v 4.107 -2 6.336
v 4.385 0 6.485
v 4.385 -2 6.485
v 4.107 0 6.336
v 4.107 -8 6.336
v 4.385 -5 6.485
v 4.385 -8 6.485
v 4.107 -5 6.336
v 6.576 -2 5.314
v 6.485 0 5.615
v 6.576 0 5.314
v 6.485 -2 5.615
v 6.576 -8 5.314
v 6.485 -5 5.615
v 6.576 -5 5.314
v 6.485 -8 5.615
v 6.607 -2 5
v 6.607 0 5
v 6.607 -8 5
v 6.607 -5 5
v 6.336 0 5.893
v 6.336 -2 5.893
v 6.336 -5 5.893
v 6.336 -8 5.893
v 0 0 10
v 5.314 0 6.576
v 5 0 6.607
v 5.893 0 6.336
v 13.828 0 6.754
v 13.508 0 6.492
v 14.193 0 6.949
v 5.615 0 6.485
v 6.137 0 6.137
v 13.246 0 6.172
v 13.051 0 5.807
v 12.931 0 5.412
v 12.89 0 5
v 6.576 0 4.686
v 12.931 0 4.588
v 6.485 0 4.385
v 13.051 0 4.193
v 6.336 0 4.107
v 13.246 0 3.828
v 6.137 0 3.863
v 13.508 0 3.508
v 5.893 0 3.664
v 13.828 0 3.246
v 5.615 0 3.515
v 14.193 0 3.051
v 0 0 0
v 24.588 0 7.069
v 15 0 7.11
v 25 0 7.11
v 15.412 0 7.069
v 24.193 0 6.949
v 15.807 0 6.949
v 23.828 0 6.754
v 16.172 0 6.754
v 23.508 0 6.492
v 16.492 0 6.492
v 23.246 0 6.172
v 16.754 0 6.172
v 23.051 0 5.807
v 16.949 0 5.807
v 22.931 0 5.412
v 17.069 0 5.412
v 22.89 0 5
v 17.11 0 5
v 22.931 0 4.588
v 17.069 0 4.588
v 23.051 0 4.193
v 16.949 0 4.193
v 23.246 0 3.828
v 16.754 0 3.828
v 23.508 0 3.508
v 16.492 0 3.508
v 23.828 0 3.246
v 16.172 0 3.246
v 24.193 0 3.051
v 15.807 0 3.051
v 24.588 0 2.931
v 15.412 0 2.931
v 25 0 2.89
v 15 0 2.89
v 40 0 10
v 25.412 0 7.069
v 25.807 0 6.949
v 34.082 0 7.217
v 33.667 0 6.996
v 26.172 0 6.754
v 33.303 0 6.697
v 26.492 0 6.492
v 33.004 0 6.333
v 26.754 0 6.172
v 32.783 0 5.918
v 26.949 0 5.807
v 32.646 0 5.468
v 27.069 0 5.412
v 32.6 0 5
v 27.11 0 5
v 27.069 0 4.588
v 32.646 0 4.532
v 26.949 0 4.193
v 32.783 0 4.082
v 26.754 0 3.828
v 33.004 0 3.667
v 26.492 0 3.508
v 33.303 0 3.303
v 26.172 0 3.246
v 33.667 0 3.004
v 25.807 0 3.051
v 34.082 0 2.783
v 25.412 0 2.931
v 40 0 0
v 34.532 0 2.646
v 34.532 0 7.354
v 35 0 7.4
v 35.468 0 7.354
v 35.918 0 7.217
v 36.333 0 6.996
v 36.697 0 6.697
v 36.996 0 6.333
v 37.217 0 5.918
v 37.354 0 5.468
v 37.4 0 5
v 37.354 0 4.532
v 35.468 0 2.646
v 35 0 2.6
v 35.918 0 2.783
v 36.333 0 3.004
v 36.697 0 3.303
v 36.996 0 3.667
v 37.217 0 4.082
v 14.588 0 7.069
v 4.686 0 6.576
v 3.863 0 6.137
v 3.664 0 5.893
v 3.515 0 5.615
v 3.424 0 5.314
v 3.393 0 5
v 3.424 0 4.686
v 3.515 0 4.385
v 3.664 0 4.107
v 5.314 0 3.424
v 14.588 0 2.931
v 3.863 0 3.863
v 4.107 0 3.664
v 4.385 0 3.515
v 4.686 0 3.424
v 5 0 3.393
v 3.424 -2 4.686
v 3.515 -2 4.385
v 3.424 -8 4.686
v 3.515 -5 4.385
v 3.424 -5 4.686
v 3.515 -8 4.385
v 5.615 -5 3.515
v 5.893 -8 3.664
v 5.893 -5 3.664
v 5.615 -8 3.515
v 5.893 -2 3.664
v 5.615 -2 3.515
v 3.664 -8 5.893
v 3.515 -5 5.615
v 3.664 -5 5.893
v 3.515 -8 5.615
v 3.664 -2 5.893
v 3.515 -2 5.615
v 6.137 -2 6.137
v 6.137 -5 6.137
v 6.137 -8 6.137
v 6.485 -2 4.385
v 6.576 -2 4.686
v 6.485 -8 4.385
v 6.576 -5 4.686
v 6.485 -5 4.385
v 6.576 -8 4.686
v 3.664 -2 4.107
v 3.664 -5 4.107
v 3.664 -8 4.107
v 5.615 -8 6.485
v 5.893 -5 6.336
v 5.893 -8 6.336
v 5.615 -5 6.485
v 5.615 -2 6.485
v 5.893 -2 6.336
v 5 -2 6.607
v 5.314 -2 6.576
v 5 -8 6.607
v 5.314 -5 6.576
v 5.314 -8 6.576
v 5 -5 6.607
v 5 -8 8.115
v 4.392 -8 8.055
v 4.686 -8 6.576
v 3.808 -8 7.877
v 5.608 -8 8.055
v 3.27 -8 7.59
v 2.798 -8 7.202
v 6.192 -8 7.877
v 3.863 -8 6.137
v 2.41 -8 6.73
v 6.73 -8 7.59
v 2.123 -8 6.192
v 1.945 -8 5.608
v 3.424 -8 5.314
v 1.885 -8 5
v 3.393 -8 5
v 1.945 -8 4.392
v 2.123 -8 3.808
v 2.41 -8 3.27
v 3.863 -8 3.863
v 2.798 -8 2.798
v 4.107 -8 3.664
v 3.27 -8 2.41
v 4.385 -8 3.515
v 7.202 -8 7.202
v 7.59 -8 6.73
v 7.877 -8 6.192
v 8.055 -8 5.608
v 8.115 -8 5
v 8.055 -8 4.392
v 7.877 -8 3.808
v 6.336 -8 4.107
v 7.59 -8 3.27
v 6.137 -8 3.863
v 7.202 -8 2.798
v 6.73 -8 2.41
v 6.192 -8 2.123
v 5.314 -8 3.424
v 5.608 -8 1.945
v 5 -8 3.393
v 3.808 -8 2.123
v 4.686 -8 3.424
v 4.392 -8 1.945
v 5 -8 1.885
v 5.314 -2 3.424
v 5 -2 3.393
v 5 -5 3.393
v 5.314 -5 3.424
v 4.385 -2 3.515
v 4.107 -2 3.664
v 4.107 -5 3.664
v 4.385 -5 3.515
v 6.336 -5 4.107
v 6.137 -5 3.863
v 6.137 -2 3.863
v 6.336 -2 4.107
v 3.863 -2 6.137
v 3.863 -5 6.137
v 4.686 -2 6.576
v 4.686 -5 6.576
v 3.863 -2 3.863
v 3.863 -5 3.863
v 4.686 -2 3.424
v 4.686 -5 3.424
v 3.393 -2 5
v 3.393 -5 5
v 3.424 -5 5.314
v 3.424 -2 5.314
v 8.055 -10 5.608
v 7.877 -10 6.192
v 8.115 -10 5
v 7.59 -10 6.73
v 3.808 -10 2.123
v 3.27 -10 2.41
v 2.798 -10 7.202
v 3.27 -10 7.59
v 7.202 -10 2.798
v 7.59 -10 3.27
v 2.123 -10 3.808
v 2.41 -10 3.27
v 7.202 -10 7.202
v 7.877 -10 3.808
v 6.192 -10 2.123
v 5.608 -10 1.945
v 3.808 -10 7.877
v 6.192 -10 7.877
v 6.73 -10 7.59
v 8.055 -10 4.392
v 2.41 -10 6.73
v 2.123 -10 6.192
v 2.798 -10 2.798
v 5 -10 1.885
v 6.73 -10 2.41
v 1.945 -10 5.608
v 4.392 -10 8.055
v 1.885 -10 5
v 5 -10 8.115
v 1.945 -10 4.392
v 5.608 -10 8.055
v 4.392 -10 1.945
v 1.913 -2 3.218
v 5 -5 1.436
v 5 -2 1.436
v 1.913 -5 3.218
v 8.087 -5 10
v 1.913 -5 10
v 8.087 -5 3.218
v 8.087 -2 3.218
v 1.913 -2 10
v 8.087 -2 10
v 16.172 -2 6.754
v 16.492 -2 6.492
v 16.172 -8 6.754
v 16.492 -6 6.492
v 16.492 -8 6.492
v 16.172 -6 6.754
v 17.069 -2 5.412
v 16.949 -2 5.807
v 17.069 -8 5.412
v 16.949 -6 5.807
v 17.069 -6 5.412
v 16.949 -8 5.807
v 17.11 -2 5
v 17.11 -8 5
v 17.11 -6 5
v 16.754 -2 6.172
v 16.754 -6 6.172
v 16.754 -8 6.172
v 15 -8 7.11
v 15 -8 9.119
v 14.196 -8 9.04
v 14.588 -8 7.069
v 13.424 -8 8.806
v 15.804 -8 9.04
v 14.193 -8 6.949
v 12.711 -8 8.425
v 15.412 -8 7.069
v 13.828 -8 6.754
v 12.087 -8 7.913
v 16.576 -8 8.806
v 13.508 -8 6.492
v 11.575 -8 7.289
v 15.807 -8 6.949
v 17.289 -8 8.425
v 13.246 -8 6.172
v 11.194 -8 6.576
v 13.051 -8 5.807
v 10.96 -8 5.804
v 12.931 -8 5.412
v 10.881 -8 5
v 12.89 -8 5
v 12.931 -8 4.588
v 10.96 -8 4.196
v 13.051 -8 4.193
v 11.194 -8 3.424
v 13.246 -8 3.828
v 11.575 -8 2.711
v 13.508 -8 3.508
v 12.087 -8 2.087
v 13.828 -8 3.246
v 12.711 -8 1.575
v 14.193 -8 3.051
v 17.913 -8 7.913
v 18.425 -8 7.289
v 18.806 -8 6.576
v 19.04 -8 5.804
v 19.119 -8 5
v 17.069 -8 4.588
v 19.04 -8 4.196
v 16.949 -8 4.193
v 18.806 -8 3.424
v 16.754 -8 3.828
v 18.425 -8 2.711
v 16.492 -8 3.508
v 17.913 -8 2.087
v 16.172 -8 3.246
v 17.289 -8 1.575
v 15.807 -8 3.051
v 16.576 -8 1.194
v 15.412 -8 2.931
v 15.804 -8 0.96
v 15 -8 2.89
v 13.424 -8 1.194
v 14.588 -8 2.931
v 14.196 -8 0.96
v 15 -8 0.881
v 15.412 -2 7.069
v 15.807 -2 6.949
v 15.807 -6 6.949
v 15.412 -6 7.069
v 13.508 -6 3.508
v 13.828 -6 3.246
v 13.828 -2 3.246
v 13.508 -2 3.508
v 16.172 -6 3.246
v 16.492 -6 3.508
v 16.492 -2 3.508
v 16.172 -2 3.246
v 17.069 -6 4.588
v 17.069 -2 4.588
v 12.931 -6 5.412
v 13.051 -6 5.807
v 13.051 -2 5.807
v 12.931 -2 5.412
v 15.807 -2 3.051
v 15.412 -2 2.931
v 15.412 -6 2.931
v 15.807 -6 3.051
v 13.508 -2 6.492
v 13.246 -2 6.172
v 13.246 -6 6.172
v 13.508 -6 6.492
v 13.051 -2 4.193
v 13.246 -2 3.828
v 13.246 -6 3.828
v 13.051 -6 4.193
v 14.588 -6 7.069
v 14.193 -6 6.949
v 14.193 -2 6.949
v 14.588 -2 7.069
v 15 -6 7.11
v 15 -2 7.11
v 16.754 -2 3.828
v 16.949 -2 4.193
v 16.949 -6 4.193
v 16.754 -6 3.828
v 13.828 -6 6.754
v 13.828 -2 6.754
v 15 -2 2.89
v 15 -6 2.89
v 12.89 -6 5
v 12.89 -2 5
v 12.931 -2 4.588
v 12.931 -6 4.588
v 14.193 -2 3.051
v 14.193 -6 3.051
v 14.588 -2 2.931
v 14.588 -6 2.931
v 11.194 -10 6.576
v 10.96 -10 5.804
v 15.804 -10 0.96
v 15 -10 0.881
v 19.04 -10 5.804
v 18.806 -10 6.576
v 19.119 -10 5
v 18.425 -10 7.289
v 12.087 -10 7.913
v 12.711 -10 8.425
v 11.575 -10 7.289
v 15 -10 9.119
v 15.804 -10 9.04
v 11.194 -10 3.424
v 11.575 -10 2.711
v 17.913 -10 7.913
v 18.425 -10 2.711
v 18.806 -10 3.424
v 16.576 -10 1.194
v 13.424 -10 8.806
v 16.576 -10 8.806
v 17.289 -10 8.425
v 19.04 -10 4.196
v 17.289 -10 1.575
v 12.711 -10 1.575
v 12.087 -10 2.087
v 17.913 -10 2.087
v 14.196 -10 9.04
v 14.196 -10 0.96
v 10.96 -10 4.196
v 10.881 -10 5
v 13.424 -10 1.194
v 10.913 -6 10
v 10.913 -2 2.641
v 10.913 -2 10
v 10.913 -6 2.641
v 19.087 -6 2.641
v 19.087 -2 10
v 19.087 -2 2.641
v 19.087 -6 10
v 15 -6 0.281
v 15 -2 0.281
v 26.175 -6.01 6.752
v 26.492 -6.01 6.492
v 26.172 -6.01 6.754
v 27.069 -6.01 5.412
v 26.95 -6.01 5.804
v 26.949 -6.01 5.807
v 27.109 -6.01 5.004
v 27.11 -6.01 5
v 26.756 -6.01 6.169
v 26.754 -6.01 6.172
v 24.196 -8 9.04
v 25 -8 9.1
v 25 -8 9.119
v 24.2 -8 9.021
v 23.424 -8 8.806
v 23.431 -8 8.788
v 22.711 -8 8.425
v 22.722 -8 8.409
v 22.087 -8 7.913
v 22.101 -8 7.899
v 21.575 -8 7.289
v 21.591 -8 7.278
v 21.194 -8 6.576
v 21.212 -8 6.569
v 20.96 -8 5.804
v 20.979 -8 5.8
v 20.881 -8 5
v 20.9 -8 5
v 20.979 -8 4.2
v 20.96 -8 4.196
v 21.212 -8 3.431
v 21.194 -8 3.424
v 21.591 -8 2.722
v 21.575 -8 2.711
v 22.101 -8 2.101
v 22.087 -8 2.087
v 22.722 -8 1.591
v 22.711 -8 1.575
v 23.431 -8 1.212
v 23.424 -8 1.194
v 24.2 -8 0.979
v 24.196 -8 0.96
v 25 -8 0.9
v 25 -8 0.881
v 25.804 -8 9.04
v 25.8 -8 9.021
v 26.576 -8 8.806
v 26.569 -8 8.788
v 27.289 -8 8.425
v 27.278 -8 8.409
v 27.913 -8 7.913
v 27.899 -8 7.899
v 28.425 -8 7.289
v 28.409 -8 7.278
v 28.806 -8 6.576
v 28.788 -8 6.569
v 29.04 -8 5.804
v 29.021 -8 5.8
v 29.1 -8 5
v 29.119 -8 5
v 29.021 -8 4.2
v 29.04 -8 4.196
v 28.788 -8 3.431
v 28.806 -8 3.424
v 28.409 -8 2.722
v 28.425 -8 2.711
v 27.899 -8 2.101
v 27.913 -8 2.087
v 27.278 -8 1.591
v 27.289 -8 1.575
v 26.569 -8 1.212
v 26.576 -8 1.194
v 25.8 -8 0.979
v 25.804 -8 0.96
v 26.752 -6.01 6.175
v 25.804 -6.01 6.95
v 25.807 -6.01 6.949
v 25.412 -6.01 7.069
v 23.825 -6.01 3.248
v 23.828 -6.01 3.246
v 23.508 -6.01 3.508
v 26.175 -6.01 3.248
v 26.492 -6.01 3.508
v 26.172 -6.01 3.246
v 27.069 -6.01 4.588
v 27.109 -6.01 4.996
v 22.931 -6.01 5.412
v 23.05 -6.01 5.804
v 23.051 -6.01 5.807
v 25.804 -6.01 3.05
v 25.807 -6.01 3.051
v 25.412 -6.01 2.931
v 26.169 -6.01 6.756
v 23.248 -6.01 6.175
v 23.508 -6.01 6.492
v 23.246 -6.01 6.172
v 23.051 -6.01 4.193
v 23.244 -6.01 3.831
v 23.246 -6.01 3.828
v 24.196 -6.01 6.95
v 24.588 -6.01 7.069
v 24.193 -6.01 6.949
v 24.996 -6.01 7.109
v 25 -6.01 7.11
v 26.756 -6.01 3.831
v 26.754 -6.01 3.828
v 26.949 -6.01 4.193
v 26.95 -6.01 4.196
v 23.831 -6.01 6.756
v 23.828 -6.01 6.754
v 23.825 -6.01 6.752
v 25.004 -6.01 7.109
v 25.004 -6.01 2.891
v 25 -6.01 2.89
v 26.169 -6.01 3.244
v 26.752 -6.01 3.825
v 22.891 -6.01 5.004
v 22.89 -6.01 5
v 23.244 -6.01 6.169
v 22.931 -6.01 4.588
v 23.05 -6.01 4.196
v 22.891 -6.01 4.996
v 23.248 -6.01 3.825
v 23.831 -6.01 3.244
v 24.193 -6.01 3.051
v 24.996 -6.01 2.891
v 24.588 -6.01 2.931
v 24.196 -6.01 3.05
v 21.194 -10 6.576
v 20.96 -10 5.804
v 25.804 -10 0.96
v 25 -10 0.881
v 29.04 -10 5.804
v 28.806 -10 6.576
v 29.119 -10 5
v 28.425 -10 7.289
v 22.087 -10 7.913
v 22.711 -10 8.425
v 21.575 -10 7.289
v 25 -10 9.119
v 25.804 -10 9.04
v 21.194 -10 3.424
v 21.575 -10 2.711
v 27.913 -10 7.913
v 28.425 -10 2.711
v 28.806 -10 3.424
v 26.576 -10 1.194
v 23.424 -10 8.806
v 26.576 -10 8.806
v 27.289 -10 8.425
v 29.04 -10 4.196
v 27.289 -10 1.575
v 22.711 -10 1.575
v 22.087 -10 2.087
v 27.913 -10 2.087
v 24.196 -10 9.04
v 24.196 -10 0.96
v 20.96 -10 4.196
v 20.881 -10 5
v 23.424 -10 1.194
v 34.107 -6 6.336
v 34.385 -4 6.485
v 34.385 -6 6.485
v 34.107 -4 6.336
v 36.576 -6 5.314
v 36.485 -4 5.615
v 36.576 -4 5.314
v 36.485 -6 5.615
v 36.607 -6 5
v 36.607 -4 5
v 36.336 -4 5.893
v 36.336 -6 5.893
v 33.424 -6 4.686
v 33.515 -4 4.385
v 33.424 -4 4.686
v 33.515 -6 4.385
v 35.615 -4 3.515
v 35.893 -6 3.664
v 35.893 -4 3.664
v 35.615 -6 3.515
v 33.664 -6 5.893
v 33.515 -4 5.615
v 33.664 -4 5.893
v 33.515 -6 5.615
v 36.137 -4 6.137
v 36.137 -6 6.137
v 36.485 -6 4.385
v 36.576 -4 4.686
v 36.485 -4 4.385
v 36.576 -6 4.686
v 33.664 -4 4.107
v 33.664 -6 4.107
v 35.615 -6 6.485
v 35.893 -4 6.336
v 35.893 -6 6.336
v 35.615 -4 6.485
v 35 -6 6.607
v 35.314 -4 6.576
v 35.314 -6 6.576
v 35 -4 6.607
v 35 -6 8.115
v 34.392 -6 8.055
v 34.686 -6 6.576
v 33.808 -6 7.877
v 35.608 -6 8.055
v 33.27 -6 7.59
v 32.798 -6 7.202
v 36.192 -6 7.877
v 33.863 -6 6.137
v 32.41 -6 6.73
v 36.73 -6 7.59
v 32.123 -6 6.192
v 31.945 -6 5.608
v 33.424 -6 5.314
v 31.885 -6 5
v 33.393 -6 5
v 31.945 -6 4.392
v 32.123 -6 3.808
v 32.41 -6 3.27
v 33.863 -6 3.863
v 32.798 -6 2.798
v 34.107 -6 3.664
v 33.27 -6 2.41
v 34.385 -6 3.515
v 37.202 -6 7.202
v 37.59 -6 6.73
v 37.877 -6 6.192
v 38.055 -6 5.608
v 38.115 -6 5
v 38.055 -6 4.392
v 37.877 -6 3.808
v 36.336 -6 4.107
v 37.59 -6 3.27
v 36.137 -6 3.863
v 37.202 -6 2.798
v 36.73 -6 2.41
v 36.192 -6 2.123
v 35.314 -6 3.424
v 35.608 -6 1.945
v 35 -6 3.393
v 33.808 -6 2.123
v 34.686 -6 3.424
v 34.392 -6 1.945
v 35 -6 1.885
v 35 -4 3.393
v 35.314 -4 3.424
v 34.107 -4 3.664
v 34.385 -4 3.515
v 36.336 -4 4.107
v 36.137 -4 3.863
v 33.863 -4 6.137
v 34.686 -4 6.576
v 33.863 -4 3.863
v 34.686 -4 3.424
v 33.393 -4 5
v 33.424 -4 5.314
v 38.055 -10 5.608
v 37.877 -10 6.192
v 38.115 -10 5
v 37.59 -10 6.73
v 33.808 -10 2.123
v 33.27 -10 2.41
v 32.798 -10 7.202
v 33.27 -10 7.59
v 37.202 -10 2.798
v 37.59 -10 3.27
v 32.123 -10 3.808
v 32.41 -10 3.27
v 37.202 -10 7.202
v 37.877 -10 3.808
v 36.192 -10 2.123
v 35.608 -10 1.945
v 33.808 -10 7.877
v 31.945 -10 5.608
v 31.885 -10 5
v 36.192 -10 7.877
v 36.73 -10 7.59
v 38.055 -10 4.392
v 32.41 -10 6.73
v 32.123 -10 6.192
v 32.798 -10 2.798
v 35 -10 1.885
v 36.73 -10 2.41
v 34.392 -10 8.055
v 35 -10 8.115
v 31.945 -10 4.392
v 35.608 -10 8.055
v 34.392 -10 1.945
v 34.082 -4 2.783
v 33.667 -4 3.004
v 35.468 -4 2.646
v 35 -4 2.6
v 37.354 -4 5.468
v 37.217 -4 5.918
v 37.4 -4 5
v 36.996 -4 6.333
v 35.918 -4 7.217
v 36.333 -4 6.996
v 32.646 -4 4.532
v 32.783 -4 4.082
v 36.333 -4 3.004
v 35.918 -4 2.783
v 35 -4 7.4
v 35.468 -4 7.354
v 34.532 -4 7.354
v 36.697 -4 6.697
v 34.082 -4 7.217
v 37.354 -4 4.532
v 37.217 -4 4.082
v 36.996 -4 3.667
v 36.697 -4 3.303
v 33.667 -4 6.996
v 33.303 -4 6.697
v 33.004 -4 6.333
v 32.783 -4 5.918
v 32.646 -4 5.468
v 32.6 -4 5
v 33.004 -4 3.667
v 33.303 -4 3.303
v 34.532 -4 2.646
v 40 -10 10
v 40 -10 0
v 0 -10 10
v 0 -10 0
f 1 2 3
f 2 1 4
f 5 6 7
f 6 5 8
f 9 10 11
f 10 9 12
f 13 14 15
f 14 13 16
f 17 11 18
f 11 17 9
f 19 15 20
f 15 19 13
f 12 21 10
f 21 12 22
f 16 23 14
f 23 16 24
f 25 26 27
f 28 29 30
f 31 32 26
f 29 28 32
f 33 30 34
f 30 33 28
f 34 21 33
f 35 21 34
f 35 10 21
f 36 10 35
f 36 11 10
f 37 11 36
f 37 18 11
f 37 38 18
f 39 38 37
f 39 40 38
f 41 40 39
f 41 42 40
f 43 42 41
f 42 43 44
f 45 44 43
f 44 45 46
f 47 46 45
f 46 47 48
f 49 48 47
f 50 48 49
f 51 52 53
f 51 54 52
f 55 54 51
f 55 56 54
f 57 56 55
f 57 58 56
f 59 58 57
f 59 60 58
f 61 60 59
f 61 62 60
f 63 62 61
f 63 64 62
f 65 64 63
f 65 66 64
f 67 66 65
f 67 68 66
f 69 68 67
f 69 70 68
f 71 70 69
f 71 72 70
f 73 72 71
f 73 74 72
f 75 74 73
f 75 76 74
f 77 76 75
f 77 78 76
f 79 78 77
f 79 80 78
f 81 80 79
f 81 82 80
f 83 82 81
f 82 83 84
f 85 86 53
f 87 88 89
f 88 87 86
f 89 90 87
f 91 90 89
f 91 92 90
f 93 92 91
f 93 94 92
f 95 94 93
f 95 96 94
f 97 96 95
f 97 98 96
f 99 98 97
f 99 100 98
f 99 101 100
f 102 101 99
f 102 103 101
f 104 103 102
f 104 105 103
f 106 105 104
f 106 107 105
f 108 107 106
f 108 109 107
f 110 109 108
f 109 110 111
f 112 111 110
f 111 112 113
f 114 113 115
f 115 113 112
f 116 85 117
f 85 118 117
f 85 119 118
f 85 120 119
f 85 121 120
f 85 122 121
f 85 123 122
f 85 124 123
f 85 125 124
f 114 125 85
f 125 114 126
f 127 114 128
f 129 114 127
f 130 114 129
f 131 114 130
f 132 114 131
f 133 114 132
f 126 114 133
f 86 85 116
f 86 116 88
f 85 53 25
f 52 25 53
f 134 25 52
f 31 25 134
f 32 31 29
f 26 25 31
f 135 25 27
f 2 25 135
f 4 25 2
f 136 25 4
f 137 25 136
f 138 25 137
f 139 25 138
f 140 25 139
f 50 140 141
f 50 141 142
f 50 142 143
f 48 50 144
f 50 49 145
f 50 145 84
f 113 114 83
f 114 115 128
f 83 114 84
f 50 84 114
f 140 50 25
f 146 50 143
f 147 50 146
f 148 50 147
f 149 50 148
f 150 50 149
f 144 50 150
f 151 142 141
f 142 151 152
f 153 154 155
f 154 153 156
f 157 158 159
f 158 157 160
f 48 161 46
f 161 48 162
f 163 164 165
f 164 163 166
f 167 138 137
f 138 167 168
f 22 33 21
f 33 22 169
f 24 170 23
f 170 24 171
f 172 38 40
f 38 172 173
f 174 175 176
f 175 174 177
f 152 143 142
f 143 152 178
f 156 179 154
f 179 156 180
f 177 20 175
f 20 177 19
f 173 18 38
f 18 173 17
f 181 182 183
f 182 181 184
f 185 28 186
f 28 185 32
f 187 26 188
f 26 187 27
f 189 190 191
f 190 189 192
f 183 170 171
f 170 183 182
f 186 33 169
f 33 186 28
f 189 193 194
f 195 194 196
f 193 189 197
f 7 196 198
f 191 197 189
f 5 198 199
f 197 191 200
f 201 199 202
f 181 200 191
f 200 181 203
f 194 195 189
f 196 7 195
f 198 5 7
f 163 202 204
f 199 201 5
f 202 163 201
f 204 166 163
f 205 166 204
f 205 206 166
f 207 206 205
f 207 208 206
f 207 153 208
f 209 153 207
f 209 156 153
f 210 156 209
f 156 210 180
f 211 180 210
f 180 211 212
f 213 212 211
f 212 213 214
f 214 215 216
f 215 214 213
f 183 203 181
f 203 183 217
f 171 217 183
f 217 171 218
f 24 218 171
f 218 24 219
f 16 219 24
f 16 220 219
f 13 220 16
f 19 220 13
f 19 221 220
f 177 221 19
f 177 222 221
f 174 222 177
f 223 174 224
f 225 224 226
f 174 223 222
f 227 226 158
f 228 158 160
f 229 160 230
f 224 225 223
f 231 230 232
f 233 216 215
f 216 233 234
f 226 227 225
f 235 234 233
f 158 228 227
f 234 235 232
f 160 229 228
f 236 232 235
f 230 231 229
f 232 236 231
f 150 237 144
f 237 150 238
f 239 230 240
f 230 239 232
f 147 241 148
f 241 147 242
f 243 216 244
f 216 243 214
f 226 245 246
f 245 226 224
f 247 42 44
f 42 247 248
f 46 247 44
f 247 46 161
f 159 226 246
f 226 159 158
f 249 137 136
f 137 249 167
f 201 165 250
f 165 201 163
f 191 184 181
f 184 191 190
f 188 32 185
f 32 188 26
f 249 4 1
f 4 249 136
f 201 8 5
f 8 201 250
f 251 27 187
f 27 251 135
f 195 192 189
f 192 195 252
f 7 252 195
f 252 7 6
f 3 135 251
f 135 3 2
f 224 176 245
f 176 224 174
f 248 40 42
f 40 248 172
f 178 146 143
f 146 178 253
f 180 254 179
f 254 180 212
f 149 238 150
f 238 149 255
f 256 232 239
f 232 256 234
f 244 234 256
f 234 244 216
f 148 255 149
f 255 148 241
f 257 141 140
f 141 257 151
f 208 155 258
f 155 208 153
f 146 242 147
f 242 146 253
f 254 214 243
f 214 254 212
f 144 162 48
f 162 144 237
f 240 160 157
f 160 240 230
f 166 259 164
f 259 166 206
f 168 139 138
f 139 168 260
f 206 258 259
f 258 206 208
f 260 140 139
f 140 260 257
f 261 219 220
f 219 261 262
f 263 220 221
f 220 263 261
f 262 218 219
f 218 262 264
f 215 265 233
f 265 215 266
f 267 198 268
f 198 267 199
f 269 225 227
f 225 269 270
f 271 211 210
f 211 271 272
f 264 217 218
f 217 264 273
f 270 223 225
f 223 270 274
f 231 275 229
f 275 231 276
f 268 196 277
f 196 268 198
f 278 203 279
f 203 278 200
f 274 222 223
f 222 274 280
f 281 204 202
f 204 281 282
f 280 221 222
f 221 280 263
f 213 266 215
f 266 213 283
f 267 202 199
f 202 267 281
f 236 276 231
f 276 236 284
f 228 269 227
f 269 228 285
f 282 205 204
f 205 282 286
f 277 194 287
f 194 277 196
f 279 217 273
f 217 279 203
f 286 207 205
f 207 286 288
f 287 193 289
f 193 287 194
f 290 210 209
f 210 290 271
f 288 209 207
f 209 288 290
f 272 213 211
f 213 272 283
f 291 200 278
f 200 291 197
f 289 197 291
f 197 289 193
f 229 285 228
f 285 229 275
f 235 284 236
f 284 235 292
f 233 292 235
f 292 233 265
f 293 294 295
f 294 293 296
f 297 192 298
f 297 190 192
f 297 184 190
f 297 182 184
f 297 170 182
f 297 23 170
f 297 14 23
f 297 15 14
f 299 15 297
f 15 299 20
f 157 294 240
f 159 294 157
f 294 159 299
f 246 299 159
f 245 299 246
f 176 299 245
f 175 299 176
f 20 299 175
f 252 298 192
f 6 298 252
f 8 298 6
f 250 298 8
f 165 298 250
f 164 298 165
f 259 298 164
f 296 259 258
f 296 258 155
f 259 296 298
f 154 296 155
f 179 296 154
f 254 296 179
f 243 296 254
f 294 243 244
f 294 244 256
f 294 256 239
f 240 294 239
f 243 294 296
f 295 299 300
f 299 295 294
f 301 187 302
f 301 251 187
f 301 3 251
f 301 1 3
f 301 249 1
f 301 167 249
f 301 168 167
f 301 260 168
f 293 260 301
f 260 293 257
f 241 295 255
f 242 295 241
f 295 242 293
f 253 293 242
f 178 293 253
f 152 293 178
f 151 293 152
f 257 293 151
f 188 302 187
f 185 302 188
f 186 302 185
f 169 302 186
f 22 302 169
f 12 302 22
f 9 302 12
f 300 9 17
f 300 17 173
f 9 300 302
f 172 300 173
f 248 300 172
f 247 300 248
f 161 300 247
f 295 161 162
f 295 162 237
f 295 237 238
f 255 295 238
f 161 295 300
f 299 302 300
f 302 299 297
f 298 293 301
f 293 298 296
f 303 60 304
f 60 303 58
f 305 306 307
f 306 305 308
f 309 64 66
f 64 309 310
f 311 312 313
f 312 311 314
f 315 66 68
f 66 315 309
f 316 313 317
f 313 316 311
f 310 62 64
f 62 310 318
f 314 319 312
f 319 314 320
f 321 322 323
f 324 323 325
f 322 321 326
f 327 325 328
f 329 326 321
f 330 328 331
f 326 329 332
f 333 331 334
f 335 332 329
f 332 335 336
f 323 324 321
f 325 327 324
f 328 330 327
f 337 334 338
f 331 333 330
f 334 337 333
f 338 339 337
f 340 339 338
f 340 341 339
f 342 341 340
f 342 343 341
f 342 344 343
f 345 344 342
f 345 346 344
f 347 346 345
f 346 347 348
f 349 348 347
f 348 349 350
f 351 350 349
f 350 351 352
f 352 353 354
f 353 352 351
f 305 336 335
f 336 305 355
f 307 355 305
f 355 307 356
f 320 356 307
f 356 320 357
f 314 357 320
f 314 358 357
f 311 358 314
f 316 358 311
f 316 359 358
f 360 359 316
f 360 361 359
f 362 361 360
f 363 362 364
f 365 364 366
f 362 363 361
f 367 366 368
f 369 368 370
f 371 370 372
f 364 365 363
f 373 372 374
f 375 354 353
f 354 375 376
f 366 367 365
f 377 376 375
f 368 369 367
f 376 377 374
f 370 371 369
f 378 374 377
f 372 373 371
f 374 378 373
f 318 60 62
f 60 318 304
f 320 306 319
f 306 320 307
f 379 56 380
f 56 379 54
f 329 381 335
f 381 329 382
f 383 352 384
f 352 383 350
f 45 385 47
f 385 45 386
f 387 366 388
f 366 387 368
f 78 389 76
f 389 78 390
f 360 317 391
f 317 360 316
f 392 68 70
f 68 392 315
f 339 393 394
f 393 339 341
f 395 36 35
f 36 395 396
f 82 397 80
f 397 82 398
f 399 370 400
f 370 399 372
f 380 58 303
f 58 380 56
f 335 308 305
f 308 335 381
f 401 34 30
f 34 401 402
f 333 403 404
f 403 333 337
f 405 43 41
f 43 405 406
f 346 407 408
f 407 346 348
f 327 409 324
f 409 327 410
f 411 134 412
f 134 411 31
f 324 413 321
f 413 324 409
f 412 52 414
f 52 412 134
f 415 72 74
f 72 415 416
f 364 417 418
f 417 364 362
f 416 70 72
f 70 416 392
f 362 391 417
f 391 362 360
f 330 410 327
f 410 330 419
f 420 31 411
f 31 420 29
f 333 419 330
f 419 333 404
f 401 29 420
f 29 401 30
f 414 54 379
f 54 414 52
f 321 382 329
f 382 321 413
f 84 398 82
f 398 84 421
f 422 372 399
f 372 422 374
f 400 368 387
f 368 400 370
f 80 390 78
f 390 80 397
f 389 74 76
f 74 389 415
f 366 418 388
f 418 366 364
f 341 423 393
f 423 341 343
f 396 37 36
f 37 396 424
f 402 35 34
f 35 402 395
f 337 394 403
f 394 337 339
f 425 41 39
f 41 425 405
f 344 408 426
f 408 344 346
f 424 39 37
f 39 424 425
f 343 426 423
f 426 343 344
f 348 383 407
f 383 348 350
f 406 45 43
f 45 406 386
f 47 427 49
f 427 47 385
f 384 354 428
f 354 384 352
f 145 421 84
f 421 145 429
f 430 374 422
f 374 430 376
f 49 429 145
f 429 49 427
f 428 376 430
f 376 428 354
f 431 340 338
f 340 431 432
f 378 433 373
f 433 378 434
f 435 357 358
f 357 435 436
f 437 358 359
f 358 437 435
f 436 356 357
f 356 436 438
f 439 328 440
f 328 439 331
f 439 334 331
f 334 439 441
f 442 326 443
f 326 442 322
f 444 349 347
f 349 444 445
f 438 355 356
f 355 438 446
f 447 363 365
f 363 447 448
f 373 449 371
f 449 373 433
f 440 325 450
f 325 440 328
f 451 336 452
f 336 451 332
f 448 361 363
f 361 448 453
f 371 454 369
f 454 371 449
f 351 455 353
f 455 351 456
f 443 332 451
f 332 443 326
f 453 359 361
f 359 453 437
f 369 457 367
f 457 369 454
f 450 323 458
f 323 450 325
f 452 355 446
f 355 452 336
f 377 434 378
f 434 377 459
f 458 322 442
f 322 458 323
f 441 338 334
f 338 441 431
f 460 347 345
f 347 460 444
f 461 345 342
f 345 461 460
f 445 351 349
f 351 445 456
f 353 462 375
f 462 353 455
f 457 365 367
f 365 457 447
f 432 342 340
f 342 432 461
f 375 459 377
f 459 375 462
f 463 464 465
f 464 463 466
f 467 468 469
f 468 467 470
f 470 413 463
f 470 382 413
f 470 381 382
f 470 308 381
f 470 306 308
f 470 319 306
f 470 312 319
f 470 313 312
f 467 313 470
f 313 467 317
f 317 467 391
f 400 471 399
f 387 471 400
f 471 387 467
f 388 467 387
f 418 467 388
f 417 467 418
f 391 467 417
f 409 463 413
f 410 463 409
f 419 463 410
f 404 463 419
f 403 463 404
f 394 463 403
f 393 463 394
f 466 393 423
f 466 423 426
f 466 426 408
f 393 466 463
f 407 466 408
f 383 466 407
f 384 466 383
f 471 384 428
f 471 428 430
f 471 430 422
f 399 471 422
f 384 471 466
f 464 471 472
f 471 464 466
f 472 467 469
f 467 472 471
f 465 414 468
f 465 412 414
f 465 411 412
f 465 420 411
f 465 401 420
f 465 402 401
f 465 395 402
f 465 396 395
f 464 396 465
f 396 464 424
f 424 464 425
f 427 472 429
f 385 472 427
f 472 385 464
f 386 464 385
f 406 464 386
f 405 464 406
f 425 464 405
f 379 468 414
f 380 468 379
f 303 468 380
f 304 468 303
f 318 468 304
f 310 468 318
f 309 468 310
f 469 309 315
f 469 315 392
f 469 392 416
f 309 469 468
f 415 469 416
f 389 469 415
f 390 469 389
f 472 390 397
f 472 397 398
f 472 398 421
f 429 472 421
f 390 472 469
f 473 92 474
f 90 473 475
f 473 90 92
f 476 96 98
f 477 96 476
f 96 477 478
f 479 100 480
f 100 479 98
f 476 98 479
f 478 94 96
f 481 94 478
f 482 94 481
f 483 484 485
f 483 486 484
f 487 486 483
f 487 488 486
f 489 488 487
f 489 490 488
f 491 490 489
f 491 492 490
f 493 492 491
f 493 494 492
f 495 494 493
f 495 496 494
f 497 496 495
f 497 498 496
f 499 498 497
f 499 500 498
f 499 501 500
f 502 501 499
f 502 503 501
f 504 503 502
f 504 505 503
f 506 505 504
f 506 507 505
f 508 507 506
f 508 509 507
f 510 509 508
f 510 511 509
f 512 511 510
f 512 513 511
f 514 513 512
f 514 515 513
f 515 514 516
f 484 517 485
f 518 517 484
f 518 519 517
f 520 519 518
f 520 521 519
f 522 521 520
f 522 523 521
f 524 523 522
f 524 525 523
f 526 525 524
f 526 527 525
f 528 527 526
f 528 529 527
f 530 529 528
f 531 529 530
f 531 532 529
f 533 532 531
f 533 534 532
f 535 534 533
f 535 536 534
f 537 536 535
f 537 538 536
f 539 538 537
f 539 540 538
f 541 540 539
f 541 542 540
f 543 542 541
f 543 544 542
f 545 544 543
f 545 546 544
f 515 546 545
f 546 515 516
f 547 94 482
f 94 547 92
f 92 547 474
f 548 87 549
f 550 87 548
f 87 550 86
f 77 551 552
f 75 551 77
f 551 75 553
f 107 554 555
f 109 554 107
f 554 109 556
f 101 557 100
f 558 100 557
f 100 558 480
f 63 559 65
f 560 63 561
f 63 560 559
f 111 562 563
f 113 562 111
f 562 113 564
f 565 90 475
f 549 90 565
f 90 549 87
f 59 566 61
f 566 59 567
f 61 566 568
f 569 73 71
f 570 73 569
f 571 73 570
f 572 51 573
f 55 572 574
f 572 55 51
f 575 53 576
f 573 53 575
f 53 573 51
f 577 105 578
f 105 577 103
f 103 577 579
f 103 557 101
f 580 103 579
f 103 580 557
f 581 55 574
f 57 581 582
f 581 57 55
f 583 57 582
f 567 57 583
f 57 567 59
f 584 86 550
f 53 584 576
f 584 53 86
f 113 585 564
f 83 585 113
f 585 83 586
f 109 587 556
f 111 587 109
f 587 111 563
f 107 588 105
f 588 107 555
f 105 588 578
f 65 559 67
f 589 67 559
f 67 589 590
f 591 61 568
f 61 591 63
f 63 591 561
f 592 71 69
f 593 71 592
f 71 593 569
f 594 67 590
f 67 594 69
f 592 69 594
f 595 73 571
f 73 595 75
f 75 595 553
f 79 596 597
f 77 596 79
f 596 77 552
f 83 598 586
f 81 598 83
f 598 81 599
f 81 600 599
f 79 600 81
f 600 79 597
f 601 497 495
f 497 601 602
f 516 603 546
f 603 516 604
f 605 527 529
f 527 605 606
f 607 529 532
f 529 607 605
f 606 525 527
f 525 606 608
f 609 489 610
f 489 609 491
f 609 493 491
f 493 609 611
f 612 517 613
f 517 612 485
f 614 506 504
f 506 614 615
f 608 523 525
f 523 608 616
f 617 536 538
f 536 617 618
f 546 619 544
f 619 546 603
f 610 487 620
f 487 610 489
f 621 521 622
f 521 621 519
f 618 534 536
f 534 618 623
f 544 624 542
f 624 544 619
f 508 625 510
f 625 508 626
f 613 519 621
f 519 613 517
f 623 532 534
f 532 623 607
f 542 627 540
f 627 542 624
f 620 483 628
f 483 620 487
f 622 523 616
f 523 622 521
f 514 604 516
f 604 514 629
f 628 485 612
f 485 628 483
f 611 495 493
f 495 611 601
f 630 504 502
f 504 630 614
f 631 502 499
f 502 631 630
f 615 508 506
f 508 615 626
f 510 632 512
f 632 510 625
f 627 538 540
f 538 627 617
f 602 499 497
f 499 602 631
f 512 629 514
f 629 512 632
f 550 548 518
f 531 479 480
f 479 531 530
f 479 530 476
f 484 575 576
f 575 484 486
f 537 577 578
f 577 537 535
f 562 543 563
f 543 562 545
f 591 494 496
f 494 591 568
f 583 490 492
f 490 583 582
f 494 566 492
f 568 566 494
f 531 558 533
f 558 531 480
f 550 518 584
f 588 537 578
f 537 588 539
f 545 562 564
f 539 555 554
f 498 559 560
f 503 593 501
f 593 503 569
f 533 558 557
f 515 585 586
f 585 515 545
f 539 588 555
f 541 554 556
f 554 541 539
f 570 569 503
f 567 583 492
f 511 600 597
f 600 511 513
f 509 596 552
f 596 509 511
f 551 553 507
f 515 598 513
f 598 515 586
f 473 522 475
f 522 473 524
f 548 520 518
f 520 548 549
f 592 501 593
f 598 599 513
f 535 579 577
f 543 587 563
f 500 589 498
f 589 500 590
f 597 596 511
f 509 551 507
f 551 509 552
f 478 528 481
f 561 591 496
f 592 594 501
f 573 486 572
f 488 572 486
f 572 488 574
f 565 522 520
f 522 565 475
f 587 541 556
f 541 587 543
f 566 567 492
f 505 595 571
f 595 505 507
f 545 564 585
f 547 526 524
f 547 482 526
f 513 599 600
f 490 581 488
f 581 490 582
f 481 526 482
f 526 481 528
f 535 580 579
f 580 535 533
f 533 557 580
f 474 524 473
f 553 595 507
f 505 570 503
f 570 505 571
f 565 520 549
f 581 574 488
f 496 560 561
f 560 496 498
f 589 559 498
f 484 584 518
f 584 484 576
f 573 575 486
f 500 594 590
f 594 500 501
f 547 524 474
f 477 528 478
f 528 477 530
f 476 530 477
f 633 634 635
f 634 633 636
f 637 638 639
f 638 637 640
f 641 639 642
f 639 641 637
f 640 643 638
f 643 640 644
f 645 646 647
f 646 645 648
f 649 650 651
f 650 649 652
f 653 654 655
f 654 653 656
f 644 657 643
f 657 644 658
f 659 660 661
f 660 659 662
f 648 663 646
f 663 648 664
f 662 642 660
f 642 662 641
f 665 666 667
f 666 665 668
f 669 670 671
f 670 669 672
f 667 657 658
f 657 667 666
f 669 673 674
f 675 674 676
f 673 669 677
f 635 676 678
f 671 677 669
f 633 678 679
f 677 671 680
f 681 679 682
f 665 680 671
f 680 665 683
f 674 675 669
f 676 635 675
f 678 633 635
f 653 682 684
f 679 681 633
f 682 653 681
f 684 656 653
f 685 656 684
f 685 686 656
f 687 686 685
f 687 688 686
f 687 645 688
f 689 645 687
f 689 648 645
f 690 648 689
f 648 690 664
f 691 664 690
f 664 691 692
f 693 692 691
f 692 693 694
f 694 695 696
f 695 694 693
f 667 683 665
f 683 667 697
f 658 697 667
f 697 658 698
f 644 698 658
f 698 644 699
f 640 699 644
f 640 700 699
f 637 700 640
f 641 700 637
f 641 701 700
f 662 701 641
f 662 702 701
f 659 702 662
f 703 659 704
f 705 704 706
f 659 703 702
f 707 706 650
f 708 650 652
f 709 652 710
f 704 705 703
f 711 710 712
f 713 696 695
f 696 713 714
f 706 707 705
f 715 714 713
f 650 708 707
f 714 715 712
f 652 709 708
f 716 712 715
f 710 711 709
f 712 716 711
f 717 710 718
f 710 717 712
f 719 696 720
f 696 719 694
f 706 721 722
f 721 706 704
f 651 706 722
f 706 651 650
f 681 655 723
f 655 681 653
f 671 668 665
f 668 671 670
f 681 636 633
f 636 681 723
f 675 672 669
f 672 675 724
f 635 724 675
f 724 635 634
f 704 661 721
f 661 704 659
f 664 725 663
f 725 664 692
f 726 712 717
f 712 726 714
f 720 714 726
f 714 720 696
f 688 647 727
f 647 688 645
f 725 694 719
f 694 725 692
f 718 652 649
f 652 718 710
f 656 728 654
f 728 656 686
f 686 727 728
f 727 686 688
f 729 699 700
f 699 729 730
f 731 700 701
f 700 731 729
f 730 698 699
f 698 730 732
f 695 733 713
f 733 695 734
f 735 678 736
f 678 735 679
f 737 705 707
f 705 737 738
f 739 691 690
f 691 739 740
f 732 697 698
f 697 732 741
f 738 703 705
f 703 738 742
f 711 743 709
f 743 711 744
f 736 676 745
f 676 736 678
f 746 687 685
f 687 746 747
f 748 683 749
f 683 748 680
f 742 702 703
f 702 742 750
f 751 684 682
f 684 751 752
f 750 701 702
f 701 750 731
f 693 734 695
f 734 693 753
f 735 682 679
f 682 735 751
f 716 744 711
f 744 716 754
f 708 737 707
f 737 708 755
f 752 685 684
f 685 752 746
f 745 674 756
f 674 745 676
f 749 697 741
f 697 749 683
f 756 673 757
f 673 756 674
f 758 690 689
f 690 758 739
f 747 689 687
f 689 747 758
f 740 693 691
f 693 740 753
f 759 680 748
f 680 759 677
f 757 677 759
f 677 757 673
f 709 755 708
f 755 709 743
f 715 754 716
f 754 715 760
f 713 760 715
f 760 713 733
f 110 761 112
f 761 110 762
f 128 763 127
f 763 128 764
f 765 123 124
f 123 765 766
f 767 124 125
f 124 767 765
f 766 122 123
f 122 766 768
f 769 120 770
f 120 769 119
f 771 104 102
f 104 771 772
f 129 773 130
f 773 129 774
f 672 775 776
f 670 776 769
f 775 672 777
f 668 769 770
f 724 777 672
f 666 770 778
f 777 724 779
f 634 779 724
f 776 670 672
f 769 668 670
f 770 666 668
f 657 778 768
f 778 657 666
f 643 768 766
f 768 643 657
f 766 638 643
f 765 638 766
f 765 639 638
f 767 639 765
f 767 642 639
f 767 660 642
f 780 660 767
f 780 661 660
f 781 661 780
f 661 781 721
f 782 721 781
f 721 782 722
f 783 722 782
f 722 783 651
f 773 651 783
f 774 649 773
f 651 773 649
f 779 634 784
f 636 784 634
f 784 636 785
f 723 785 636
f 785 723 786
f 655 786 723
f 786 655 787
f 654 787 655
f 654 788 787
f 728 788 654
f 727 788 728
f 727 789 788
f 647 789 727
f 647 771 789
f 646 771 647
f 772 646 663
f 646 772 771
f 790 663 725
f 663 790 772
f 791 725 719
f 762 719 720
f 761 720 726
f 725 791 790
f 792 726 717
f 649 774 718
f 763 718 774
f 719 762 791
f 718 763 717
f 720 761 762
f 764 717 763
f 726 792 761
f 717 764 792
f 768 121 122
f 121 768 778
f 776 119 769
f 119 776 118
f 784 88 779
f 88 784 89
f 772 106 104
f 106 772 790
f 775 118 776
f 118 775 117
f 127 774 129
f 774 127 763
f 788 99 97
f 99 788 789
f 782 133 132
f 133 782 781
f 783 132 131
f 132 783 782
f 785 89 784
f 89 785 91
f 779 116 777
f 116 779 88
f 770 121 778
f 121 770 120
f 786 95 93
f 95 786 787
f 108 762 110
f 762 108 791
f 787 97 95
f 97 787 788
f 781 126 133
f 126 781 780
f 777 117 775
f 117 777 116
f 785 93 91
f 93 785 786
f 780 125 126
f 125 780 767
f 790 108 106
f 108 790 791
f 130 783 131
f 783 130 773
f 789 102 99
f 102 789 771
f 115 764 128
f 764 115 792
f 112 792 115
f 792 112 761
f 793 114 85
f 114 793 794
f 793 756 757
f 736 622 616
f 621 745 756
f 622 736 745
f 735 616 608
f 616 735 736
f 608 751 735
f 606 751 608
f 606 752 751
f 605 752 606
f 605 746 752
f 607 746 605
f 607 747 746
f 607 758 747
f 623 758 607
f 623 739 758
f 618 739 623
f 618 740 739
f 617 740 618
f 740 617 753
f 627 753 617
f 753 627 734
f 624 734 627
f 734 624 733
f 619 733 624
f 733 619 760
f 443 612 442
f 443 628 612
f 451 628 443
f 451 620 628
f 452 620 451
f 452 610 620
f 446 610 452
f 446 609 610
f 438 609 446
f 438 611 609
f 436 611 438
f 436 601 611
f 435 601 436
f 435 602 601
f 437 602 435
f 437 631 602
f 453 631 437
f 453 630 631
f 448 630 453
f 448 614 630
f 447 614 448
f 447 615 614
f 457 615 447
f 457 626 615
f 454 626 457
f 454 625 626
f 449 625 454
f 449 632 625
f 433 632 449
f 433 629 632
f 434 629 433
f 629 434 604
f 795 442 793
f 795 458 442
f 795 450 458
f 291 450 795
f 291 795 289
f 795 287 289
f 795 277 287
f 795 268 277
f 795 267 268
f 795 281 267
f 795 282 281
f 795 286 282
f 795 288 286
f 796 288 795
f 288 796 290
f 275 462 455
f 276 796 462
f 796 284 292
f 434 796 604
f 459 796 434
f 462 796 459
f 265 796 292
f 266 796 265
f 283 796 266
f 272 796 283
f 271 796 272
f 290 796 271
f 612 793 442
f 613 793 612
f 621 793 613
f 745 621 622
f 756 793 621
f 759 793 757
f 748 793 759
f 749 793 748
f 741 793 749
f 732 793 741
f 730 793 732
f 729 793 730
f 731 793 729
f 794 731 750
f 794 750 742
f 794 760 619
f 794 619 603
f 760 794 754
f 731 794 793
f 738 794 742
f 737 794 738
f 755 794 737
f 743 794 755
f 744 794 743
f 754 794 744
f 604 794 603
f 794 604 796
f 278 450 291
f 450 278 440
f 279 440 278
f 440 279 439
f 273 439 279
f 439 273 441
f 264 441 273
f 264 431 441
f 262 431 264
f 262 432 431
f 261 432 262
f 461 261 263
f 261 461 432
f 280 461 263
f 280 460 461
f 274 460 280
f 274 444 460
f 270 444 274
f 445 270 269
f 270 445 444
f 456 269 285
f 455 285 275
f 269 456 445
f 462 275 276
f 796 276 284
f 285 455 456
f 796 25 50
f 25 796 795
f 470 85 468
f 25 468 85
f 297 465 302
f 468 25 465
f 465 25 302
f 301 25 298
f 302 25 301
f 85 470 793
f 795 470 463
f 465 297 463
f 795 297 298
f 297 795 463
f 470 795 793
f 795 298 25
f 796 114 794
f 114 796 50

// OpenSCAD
$radial_error = 0.1;
$fn = 4*8;

module cylinder_outer(height, radius, fn=$fn, radial_error=$radial_error) {
	fudge = 1/cos(180/fn);
	cylinder(h=height,r=radius*fudge+$radial_error, $fn=fn);
}

module cylinder_inner(height, radius, fn=$fn) {
	cylinder(h=height,r=radius-$radial_error,$fn=fn);
}

// Make a hole. The diameter is the size of the screw (e.g. 3 for M3). Depth is how far the hole should go for the thread, and inset is how far out there should be a hole for the head to go.
module hole(diameter=3, depth=6, inset=10) {
	cylinder_outer(depth, diameter/2);
	translate([0, 0, depth]) cylinder_outer(inset, diameter, 32);
}

module countersunk_hole(diameter=3, depth=6, inset=10) {
	hole(diameter, depth, inset);
	translate([0, 0, depth-diameter/2]) cylinder(r1=diameter/2+$radial_error, r2=diameter+$radial_error, h=diameter/2);
}

module threaded_countersunk_hole(diameter=3, depth=6, inset=10) {
	hole(diameter*0.9, depth, inset);
	translate([0, 0, depth-diameter/2]) cylinder(r1=diameter/2+$radial_error, r2=diameter+$radial_error, h=diameter/2);
}

module knurled_insert(diameter = 3, depth = 6, thickness = 1) {
	cylinder_inner(depth, diameter/2 + thickness);
}

module knurled_hole(diameter = 3, depth = 6, inset = 10, insert = 4, thickness = 1) {
	hole(diameter, depth, inset);
	
	knurled_insert(diameter, insert, thickness);
}

module countersunk_knurled_hole(diameter = 3, depth = 6, inset = 10, insert = 4, thickness = 1) {
	countersunk_hole(diameter, depth, inset);
	
	knurled_insert(diameter, insert, thickness);
}

// Make a hole for a bolt/screw combination.
module bolted_hole(diameter=3, depth=8, nut_offset=2, shaft_length=10, inset=10) {
	hole(diameter, depth, inset);
	hull() {
		shaft_width = diameter;
		translate([0, 0, nut_offset]) rotate(360/12, [0, 0, 1]) cylinder_outer(diameter, shaft_width, 6);
		translate([0, shaft_length, nut_offset]) rotate(360/12, [0, 0, 1]) cylinder_outer(diameter, shaft_width, 6);
	}
}

module countersunk_bolted_hole(diameter=3, depth=8, nut_offset=2, shaft_length=10, inset=10) {
	countersunk_hole(diameter, depth, inset);
	hull() {
		shaft_width = diameter;
		translate([0, 0, nut_offset]) rotate(360/12, [0, 0, 1]) cylinder_outer(diameter, shaft_width, 6);
		translate([0, shaft_length, nut_offset]) rotate(360/12, [0, 0, 1]) cylinder_outer(diameter, shaft_width, 6);
	}
}

module mounting_hole(diameter=3, depth=6, inset=10, outset=3) {
	difference() {
		cylinder_outer(depth, diameter/2+outset);
		hole(diameter=diameter, depth=depth, inset=inset);
	}
}

render() rotate(90, [1, 0, 0]) difference() {
	cube([40, 10, 10]);
	translate([5, 5, 0]) bolted_hole(diameter=3, depth=8);
	translate([15, 5, 0]) bolted_hole(diameter=4, depth=8);
	translate([25, 5, 0]) countersunk_hole(diameter=4, depth=8);
	translate([35, 5, 0]) knurled_hole();
}
